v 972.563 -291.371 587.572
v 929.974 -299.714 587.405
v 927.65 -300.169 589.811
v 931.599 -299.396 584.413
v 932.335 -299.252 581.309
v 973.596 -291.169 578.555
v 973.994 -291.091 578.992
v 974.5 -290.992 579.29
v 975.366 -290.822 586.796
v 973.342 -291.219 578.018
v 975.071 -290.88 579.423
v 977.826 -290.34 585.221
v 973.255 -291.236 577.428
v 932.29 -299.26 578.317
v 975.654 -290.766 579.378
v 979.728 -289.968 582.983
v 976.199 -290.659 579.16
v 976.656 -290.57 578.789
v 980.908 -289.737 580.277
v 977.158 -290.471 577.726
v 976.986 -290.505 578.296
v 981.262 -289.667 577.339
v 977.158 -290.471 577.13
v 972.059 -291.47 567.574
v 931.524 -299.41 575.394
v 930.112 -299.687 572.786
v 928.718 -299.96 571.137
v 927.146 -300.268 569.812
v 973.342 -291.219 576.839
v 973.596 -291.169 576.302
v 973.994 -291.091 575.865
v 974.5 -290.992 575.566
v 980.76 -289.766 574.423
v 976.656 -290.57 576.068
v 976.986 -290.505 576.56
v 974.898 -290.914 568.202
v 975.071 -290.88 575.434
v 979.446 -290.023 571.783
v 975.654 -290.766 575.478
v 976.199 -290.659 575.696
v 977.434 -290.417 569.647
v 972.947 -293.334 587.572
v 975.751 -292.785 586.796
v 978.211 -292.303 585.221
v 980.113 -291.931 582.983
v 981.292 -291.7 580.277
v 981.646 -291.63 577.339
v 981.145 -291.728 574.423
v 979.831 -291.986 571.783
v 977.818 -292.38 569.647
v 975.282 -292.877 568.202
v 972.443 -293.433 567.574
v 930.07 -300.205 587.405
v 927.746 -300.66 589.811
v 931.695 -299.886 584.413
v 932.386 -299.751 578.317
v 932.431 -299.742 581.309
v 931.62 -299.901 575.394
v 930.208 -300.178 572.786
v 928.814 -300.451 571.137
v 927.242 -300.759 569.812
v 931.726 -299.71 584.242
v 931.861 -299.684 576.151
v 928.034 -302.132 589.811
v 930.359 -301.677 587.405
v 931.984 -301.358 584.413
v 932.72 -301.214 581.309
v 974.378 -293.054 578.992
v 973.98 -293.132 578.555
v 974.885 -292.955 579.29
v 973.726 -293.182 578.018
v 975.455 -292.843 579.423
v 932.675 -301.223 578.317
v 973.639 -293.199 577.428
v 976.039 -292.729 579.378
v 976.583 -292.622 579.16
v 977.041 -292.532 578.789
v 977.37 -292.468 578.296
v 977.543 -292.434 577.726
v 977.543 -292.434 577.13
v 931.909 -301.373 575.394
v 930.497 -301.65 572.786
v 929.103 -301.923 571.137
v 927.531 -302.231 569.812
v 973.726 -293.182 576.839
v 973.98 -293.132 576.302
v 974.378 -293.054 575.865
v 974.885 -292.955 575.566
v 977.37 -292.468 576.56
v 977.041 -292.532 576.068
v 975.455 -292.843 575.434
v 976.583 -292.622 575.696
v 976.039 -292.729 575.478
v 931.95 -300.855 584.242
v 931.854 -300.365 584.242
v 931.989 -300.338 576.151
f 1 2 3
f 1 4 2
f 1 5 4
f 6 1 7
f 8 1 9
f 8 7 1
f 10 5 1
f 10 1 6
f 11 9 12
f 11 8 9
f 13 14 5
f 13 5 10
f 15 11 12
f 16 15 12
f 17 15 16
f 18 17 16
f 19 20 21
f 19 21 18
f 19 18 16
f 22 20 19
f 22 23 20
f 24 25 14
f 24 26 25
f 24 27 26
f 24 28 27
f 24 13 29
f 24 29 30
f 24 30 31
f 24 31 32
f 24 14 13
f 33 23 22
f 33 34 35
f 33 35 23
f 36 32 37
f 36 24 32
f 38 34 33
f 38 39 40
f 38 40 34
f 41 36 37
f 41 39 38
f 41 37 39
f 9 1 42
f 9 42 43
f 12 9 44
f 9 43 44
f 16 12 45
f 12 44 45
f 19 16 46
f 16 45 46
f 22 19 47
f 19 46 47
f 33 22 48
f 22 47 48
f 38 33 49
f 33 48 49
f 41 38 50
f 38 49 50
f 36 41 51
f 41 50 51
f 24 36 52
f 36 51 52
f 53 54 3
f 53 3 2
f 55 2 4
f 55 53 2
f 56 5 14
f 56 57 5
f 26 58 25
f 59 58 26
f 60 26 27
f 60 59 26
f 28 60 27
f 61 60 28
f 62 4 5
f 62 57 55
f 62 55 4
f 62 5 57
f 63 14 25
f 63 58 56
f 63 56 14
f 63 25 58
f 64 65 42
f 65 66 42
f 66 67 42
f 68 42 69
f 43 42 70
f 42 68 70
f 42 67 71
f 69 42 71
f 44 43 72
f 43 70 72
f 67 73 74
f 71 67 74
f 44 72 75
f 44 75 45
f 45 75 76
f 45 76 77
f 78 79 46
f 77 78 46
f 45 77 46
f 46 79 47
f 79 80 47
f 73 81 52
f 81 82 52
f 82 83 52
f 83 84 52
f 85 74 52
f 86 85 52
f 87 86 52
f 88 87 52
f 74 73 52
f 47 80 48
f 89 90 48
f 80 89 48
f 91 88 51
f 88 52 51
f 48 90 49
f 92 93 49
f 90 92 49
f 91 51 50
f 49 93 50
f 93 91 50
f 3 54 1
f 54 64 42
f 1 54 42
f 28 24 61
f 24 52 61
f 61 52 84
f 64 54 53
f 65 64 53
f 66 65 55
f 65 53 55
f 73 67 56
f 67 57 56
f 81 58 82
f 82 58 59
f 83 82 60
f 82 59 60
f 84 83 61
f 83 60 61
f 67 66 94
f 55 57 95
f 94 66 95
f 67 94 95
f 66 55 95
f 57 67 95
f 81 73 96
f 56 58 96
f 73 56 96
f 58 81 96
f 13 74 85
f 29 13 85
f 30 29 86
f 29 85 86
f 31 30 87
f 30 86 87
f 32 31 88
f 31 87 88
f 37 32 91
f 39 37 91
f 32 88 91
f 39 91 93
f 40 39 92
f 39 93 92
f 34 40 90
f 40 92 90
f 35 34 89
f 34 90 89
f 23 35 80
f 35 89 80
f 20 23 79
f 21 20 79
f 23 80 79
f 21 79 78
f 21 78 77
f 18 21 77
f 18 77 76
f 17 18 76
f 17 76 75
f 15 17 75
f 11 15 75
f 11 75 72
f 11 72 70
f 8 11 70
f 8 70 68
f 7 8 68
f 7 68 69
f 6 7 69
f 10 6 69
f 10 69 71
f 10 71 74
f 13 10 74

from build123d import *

# Parameters (mm, degrees)
DODANIE_WYCI_GNI_CIE1_DEPTH      = 1.5
DODANIE_WYCI_GNI_CIE1_DEPTH_BACK = 0.5
SZKIC2_R                         = 2
WYTNIJ_WYCI_GNI_CIE1_DEPTH       = 13.403470929


with BuildPart() as part:
    # Szkic1 → Dodanie-wyciągnięcie1 (new body, two sides)
    with BuildSketch(Plane(origin=(91.00215608, -464.566516042, 0), x_dir=(-0.981349358, -0.192232768, 0), z_dir=(0.192232768, -0.981349358, 0))) as dodanie_wyci_gni_cie1_sk:
        with BuildLine():
            Line((-852.646385939, -589.810571865), (-898.412669563, -587.572467385))
            ThreePointArc((-898.412669563, -587.572467385), (-907.277284225, -577.338883089), (-897.89920424, -567.573676668))
            Line((-897.89920424, -567.573676668), (-852.132920616, -569.811781148))
            add(Edge.make_bspline(
                [(-852.646385939, -589.810571865), (-859.599431487, -584.423041675), (-860.017825744, -575.312195542), (-852.132920616, -569.811781148)],
                knots=[-0.289090194, -0.289090194, -0.289090194, -0.289090194, 0.984325659, 0.984325659, 0.984325659, 0.984325659], degree=3, weights=[1.203316353, 0.837838315, 0.76726036, 0.991582488]))
        make_face()
    extrude(amount=DODANIE_WYCI_GNI_CIE1_DEPTH)
    extrude(dodanie_wyci_gni_cie1_sk.sketch, amount=-DODANIE_WYCI_GNI_CIE1_DEPTH_BACK)

    # Szkic2 → Wytnij-wyciągnięcie1 (cut, through all)
    with BuildSketch(Plane(origin=(91.290505232, -466.038540079, 0), x_dir=(-0.981349358, -0.192232768, 0), z_dir=(0.192232768, -0.981349358, 0))):
        with Locations((-901.117736464, -577.428231407)):
            Circle(SZKIC2_R)
    extrude(amount=-WYTNIJ_WYCI_GNI_CIE1_DEPTH, mode=Mode.SUBTRACT)


solid = part.part
